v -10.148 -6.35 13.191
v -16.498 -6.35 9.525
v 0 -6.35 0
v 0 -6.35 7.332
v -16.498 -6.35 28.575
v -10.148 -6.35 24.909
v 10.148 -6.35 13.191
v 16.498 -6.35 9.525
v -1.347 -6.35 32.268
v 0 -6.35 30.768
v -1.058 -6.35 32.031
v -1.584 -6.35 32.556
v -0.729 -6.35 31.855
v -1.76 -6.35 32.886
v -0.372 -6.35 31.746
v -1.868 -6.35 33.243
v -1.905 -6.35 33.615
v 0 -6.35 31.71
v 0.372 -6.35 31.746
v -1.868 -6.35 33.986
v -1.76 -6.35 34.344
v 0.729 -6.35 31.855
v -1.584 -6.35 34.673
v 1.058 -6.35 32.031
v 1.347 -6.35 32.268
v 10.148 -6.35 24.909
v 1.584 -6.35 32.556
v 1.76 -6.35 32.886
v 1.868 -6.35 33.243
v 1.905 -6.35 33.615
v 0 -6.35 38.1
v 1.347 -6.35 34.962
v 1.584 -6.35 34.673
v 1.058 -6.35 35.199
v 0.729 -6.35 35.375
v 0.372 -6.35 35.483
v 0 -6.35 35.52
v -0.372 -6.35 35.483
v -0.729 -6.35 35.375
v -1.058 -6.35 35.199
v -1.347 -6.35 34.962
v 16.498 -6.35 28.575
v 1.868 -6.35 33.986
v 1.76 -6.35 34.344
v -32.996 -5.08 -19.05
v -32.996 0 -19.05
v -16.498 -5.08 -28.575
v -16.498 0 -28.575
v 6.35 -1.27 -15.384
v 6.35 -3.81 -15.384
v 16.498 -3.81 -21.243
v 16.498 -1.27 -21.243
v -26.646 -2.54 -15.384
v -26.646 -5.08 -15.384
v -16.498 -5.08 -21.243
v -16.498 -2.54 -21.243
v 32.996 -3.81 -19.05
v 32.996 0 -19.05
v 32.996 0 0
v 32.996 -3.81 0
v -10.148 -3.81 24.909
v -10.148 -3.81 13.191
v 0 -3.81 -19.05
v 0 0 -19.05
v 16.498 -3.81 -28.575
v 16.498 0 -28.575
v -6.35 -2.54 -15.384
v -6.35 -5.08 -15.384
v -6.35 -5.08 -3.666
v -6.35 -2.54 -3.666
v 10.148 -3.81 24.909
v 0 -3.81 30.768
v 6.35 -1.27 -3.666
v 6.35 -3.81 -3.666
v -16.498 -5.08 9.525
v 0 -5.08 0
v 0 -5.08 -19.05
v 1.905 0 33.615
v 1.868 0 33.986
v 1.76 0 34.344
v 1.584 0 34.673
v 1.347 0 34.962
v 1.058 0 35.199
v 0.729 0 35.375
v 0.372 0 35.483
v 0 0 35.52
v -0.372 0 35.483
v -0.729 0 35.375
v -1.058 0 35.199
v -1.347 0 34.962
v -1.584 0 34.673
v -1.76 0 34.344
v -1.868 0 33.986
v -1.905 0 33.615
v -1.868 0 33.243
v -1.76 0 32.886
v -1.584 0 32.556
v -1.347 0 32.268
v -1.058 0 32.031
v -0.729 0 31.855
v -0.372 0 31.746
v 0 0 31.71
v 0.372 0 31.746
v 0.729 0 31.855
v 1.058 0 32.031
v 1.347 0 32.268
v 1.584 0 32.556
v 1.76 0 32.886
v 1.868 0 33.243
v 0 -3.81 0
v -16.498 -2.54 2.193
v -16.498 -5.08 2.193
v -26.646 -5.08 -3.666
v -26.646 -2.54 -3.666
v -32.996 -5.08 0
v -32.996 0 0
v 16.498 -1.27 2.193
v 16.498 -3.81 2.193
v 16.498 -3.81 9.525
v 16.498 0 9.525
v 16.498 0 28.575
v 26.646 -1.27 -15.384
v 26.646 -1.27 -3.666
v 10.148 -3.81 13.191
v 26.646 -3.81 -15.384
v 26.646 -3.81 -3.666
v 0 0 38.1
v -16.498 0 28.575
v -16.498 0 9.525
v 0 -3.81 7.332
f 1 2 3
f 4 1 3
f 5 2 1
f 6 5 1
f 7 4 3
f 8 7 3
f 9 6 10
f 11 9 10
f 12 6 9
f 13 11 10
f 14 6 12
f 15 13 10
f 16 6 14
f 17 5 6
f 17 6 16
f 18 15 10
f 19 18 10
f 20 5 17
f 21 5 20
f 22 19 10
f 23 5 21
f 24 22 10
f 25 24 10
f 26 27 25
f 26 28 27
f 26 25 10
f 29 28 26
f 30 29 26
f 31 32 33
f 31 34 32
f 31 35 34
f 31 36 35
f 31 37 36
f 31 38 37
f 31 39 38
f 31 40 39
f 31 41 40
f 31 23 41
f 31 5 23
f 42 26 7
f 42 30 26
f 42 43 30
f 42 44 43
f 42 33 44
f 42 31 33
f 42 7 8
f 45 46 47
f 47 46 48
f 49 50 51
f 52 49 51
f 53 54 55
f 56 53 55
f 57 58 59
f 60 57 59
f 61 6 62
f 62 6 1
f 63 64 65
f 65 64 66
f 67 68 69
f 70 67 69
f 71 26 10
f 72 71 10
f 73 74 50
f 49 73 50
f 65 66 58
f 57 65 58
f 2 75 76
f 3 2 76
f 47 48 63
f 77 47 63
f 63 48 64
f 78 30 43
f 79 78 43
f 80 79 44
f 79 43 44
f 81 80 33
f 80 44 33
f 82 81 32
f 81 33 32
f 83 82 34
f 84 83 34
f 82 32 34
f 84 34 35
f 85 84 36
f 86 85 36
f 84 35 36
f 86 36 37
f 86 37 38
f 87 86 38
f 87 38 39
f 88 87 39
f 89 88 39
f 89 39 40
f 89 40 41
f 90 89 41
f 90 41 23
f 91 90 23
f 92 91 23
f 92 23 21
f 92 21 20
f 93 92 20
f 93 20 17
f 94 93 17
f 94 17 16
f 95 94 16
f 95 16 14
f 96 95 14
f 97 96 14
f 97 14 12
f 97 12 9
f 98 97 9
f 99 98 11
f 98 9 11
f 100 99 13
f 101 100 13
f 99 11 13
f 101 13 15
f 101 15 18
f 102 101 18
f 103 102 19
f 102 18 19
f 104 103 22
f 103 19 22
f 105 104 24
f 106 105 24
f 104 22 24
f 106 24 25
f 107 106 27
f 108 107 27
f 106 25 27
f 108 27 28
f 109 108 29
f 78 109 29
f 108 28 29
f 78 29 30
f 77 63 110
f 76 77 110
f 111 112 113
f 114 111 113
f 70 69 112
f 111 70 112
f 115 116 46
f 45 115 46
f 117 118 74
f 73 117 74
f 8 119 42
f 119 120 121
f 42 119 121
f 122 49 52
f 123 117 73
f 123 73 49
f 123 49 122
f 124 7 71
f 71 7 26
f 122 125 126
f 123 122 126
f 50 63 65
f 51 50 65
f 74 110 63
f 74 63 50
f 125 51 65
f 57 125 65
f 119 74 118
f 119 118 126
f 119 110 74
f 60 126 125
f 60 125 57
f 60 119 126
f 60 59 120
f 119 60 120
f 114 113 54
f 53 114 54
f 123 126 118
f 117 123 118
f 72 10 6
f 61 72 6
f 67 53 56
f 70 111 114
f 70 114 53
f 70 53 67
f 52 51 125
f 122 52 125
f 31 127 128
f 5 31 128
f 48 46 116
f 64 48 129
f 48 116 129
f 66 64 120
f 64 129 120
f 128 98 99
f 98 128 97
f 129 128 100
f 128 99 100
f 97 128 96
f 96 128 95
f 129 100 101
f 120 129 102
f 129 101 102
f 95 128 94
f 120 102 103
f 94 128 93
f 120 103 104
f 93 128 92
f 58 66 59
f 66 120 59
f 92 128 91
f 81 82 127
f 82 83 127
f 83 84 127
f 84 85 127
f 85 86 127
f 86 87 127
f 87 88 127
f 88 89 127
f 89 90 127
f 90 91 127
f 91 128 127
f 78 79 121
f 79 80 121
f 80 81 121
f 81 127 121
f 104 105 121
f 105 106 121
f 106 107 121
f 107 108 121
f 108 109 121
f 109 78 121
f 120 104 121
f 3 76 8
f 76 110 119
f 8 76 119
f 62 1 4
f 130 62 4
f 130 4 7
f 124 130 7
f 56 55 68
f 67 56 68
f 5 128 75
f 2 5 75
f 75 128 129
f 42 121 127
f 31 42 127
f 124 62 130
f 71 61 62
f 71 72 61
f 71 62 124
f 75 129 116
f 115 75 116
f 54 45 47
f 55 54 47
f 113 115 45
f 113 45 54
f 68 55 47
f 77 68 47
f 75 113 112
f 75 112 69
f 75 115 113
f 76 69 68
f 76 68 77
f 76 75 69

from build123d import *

# Parameters (mm, degrees)
F3_DEPTH  = 6.35
F4_DEPTH  = 3.81
F5_DEPTH  = 5.08
F7_DEPTH  = 2.54
F9_DEPTH  = 2.54
F11_DEPTH = 2.54
F13_DEPTH = 1.27
F15_R     = 1.905
F16_DEPTH = 25.4


with BuildPart() as f3:
    # F0 (on Front) → F3 (new body)
    with BuildSketch(Plane.XZ):
        Polygon((0, 0), (16.497784, 9.525), (16.497784, 28.575), (0, 38.1), (-16.497784, 28.575), (-16.497784, 9.525), align=None)
    extrude(amount=F3_DEPTH)

    # F1 (on Front) → F4 (join)
    with BuildSketch(Plane.XZ):
        Polygon((16.497784, 9.525), (0, 0), (0, -19.05), (16.497784, -28.575), (32.995568, -19.05), (32.995568, 0), align=None)
    extrude(amount=F4_DEPTH)

    # F2 (on Front) → F5 (join)
    with BuildSketch(Plane.XZ):
        Polygon((-32.995568, -19.05), (-16.497784, -28.575), (0, -19.05), (0, 0), (-16.497784, 9.525), (-32.995568, 0), align=None)
    extrude(amount=F5_DEPTH)

    # F6 (on face) → F7 (cut)
    with BuildSketch(Plane.XZ.offset(6.35)):
        Polygon((-10.147784, 24.908826), (-10.147784, 13.191174), (0, 7.332348), (10.147784, 13.191174), (10.147784, 24.908826), (0, 30.767652), align=None)
    extrude(amount=-F7_DEPTH, mode=Mode.SUBTRACT)

    # F8 (on face) → F9 (cut)
    with BuildSketch(Plane.XZ.offset(5.08)):
        Polygon((-16.497784, 2.192652), (-26.645568, -3.666174), (-26.645568, -15.383826), (-16.497784, -21.242652), (-6.35, -15.383826), (-6.35, -3.666174), align=None)
    extrude(amount=-F9_DEPTH, mode=Mode.SUBTRACT)

    # F10 (on face) → F11 (cut)
    with BuildSketch(Plane.XZ.offset(3.81)):
        Polygon((16.497784, 2.192652), (6.35, -3.666174), (6.35, -15.383826), (16.497784, -21.242652), (26.645568, -15.383826), (26.645568, -3.666174), align=None)
    extrude(amount=-F11_DEPTH, mode=Mode.SUBTRACT)

    # F15 (on face) → F16 (cut)
    with BuildSketch(Plane.XZ.offset(6.35)):
        with Locations((0, 33.614568)):
            Circle(F15_R)
    extrude(amount=-F16_DEPTH, mode=Mode.SUBTRACT)


with BuildPart() as f13:
    # F12 (on Front) → F13 (new body)
    with BuildSketch(Plane.XZ):
        Polygon((0, -19.372597), (-7.288163, -23.370054), (0, -30.658217), (7.288163, -23.370054), align=None)
    extrude(amount=F13_DEPTH)


solid = f3.part
